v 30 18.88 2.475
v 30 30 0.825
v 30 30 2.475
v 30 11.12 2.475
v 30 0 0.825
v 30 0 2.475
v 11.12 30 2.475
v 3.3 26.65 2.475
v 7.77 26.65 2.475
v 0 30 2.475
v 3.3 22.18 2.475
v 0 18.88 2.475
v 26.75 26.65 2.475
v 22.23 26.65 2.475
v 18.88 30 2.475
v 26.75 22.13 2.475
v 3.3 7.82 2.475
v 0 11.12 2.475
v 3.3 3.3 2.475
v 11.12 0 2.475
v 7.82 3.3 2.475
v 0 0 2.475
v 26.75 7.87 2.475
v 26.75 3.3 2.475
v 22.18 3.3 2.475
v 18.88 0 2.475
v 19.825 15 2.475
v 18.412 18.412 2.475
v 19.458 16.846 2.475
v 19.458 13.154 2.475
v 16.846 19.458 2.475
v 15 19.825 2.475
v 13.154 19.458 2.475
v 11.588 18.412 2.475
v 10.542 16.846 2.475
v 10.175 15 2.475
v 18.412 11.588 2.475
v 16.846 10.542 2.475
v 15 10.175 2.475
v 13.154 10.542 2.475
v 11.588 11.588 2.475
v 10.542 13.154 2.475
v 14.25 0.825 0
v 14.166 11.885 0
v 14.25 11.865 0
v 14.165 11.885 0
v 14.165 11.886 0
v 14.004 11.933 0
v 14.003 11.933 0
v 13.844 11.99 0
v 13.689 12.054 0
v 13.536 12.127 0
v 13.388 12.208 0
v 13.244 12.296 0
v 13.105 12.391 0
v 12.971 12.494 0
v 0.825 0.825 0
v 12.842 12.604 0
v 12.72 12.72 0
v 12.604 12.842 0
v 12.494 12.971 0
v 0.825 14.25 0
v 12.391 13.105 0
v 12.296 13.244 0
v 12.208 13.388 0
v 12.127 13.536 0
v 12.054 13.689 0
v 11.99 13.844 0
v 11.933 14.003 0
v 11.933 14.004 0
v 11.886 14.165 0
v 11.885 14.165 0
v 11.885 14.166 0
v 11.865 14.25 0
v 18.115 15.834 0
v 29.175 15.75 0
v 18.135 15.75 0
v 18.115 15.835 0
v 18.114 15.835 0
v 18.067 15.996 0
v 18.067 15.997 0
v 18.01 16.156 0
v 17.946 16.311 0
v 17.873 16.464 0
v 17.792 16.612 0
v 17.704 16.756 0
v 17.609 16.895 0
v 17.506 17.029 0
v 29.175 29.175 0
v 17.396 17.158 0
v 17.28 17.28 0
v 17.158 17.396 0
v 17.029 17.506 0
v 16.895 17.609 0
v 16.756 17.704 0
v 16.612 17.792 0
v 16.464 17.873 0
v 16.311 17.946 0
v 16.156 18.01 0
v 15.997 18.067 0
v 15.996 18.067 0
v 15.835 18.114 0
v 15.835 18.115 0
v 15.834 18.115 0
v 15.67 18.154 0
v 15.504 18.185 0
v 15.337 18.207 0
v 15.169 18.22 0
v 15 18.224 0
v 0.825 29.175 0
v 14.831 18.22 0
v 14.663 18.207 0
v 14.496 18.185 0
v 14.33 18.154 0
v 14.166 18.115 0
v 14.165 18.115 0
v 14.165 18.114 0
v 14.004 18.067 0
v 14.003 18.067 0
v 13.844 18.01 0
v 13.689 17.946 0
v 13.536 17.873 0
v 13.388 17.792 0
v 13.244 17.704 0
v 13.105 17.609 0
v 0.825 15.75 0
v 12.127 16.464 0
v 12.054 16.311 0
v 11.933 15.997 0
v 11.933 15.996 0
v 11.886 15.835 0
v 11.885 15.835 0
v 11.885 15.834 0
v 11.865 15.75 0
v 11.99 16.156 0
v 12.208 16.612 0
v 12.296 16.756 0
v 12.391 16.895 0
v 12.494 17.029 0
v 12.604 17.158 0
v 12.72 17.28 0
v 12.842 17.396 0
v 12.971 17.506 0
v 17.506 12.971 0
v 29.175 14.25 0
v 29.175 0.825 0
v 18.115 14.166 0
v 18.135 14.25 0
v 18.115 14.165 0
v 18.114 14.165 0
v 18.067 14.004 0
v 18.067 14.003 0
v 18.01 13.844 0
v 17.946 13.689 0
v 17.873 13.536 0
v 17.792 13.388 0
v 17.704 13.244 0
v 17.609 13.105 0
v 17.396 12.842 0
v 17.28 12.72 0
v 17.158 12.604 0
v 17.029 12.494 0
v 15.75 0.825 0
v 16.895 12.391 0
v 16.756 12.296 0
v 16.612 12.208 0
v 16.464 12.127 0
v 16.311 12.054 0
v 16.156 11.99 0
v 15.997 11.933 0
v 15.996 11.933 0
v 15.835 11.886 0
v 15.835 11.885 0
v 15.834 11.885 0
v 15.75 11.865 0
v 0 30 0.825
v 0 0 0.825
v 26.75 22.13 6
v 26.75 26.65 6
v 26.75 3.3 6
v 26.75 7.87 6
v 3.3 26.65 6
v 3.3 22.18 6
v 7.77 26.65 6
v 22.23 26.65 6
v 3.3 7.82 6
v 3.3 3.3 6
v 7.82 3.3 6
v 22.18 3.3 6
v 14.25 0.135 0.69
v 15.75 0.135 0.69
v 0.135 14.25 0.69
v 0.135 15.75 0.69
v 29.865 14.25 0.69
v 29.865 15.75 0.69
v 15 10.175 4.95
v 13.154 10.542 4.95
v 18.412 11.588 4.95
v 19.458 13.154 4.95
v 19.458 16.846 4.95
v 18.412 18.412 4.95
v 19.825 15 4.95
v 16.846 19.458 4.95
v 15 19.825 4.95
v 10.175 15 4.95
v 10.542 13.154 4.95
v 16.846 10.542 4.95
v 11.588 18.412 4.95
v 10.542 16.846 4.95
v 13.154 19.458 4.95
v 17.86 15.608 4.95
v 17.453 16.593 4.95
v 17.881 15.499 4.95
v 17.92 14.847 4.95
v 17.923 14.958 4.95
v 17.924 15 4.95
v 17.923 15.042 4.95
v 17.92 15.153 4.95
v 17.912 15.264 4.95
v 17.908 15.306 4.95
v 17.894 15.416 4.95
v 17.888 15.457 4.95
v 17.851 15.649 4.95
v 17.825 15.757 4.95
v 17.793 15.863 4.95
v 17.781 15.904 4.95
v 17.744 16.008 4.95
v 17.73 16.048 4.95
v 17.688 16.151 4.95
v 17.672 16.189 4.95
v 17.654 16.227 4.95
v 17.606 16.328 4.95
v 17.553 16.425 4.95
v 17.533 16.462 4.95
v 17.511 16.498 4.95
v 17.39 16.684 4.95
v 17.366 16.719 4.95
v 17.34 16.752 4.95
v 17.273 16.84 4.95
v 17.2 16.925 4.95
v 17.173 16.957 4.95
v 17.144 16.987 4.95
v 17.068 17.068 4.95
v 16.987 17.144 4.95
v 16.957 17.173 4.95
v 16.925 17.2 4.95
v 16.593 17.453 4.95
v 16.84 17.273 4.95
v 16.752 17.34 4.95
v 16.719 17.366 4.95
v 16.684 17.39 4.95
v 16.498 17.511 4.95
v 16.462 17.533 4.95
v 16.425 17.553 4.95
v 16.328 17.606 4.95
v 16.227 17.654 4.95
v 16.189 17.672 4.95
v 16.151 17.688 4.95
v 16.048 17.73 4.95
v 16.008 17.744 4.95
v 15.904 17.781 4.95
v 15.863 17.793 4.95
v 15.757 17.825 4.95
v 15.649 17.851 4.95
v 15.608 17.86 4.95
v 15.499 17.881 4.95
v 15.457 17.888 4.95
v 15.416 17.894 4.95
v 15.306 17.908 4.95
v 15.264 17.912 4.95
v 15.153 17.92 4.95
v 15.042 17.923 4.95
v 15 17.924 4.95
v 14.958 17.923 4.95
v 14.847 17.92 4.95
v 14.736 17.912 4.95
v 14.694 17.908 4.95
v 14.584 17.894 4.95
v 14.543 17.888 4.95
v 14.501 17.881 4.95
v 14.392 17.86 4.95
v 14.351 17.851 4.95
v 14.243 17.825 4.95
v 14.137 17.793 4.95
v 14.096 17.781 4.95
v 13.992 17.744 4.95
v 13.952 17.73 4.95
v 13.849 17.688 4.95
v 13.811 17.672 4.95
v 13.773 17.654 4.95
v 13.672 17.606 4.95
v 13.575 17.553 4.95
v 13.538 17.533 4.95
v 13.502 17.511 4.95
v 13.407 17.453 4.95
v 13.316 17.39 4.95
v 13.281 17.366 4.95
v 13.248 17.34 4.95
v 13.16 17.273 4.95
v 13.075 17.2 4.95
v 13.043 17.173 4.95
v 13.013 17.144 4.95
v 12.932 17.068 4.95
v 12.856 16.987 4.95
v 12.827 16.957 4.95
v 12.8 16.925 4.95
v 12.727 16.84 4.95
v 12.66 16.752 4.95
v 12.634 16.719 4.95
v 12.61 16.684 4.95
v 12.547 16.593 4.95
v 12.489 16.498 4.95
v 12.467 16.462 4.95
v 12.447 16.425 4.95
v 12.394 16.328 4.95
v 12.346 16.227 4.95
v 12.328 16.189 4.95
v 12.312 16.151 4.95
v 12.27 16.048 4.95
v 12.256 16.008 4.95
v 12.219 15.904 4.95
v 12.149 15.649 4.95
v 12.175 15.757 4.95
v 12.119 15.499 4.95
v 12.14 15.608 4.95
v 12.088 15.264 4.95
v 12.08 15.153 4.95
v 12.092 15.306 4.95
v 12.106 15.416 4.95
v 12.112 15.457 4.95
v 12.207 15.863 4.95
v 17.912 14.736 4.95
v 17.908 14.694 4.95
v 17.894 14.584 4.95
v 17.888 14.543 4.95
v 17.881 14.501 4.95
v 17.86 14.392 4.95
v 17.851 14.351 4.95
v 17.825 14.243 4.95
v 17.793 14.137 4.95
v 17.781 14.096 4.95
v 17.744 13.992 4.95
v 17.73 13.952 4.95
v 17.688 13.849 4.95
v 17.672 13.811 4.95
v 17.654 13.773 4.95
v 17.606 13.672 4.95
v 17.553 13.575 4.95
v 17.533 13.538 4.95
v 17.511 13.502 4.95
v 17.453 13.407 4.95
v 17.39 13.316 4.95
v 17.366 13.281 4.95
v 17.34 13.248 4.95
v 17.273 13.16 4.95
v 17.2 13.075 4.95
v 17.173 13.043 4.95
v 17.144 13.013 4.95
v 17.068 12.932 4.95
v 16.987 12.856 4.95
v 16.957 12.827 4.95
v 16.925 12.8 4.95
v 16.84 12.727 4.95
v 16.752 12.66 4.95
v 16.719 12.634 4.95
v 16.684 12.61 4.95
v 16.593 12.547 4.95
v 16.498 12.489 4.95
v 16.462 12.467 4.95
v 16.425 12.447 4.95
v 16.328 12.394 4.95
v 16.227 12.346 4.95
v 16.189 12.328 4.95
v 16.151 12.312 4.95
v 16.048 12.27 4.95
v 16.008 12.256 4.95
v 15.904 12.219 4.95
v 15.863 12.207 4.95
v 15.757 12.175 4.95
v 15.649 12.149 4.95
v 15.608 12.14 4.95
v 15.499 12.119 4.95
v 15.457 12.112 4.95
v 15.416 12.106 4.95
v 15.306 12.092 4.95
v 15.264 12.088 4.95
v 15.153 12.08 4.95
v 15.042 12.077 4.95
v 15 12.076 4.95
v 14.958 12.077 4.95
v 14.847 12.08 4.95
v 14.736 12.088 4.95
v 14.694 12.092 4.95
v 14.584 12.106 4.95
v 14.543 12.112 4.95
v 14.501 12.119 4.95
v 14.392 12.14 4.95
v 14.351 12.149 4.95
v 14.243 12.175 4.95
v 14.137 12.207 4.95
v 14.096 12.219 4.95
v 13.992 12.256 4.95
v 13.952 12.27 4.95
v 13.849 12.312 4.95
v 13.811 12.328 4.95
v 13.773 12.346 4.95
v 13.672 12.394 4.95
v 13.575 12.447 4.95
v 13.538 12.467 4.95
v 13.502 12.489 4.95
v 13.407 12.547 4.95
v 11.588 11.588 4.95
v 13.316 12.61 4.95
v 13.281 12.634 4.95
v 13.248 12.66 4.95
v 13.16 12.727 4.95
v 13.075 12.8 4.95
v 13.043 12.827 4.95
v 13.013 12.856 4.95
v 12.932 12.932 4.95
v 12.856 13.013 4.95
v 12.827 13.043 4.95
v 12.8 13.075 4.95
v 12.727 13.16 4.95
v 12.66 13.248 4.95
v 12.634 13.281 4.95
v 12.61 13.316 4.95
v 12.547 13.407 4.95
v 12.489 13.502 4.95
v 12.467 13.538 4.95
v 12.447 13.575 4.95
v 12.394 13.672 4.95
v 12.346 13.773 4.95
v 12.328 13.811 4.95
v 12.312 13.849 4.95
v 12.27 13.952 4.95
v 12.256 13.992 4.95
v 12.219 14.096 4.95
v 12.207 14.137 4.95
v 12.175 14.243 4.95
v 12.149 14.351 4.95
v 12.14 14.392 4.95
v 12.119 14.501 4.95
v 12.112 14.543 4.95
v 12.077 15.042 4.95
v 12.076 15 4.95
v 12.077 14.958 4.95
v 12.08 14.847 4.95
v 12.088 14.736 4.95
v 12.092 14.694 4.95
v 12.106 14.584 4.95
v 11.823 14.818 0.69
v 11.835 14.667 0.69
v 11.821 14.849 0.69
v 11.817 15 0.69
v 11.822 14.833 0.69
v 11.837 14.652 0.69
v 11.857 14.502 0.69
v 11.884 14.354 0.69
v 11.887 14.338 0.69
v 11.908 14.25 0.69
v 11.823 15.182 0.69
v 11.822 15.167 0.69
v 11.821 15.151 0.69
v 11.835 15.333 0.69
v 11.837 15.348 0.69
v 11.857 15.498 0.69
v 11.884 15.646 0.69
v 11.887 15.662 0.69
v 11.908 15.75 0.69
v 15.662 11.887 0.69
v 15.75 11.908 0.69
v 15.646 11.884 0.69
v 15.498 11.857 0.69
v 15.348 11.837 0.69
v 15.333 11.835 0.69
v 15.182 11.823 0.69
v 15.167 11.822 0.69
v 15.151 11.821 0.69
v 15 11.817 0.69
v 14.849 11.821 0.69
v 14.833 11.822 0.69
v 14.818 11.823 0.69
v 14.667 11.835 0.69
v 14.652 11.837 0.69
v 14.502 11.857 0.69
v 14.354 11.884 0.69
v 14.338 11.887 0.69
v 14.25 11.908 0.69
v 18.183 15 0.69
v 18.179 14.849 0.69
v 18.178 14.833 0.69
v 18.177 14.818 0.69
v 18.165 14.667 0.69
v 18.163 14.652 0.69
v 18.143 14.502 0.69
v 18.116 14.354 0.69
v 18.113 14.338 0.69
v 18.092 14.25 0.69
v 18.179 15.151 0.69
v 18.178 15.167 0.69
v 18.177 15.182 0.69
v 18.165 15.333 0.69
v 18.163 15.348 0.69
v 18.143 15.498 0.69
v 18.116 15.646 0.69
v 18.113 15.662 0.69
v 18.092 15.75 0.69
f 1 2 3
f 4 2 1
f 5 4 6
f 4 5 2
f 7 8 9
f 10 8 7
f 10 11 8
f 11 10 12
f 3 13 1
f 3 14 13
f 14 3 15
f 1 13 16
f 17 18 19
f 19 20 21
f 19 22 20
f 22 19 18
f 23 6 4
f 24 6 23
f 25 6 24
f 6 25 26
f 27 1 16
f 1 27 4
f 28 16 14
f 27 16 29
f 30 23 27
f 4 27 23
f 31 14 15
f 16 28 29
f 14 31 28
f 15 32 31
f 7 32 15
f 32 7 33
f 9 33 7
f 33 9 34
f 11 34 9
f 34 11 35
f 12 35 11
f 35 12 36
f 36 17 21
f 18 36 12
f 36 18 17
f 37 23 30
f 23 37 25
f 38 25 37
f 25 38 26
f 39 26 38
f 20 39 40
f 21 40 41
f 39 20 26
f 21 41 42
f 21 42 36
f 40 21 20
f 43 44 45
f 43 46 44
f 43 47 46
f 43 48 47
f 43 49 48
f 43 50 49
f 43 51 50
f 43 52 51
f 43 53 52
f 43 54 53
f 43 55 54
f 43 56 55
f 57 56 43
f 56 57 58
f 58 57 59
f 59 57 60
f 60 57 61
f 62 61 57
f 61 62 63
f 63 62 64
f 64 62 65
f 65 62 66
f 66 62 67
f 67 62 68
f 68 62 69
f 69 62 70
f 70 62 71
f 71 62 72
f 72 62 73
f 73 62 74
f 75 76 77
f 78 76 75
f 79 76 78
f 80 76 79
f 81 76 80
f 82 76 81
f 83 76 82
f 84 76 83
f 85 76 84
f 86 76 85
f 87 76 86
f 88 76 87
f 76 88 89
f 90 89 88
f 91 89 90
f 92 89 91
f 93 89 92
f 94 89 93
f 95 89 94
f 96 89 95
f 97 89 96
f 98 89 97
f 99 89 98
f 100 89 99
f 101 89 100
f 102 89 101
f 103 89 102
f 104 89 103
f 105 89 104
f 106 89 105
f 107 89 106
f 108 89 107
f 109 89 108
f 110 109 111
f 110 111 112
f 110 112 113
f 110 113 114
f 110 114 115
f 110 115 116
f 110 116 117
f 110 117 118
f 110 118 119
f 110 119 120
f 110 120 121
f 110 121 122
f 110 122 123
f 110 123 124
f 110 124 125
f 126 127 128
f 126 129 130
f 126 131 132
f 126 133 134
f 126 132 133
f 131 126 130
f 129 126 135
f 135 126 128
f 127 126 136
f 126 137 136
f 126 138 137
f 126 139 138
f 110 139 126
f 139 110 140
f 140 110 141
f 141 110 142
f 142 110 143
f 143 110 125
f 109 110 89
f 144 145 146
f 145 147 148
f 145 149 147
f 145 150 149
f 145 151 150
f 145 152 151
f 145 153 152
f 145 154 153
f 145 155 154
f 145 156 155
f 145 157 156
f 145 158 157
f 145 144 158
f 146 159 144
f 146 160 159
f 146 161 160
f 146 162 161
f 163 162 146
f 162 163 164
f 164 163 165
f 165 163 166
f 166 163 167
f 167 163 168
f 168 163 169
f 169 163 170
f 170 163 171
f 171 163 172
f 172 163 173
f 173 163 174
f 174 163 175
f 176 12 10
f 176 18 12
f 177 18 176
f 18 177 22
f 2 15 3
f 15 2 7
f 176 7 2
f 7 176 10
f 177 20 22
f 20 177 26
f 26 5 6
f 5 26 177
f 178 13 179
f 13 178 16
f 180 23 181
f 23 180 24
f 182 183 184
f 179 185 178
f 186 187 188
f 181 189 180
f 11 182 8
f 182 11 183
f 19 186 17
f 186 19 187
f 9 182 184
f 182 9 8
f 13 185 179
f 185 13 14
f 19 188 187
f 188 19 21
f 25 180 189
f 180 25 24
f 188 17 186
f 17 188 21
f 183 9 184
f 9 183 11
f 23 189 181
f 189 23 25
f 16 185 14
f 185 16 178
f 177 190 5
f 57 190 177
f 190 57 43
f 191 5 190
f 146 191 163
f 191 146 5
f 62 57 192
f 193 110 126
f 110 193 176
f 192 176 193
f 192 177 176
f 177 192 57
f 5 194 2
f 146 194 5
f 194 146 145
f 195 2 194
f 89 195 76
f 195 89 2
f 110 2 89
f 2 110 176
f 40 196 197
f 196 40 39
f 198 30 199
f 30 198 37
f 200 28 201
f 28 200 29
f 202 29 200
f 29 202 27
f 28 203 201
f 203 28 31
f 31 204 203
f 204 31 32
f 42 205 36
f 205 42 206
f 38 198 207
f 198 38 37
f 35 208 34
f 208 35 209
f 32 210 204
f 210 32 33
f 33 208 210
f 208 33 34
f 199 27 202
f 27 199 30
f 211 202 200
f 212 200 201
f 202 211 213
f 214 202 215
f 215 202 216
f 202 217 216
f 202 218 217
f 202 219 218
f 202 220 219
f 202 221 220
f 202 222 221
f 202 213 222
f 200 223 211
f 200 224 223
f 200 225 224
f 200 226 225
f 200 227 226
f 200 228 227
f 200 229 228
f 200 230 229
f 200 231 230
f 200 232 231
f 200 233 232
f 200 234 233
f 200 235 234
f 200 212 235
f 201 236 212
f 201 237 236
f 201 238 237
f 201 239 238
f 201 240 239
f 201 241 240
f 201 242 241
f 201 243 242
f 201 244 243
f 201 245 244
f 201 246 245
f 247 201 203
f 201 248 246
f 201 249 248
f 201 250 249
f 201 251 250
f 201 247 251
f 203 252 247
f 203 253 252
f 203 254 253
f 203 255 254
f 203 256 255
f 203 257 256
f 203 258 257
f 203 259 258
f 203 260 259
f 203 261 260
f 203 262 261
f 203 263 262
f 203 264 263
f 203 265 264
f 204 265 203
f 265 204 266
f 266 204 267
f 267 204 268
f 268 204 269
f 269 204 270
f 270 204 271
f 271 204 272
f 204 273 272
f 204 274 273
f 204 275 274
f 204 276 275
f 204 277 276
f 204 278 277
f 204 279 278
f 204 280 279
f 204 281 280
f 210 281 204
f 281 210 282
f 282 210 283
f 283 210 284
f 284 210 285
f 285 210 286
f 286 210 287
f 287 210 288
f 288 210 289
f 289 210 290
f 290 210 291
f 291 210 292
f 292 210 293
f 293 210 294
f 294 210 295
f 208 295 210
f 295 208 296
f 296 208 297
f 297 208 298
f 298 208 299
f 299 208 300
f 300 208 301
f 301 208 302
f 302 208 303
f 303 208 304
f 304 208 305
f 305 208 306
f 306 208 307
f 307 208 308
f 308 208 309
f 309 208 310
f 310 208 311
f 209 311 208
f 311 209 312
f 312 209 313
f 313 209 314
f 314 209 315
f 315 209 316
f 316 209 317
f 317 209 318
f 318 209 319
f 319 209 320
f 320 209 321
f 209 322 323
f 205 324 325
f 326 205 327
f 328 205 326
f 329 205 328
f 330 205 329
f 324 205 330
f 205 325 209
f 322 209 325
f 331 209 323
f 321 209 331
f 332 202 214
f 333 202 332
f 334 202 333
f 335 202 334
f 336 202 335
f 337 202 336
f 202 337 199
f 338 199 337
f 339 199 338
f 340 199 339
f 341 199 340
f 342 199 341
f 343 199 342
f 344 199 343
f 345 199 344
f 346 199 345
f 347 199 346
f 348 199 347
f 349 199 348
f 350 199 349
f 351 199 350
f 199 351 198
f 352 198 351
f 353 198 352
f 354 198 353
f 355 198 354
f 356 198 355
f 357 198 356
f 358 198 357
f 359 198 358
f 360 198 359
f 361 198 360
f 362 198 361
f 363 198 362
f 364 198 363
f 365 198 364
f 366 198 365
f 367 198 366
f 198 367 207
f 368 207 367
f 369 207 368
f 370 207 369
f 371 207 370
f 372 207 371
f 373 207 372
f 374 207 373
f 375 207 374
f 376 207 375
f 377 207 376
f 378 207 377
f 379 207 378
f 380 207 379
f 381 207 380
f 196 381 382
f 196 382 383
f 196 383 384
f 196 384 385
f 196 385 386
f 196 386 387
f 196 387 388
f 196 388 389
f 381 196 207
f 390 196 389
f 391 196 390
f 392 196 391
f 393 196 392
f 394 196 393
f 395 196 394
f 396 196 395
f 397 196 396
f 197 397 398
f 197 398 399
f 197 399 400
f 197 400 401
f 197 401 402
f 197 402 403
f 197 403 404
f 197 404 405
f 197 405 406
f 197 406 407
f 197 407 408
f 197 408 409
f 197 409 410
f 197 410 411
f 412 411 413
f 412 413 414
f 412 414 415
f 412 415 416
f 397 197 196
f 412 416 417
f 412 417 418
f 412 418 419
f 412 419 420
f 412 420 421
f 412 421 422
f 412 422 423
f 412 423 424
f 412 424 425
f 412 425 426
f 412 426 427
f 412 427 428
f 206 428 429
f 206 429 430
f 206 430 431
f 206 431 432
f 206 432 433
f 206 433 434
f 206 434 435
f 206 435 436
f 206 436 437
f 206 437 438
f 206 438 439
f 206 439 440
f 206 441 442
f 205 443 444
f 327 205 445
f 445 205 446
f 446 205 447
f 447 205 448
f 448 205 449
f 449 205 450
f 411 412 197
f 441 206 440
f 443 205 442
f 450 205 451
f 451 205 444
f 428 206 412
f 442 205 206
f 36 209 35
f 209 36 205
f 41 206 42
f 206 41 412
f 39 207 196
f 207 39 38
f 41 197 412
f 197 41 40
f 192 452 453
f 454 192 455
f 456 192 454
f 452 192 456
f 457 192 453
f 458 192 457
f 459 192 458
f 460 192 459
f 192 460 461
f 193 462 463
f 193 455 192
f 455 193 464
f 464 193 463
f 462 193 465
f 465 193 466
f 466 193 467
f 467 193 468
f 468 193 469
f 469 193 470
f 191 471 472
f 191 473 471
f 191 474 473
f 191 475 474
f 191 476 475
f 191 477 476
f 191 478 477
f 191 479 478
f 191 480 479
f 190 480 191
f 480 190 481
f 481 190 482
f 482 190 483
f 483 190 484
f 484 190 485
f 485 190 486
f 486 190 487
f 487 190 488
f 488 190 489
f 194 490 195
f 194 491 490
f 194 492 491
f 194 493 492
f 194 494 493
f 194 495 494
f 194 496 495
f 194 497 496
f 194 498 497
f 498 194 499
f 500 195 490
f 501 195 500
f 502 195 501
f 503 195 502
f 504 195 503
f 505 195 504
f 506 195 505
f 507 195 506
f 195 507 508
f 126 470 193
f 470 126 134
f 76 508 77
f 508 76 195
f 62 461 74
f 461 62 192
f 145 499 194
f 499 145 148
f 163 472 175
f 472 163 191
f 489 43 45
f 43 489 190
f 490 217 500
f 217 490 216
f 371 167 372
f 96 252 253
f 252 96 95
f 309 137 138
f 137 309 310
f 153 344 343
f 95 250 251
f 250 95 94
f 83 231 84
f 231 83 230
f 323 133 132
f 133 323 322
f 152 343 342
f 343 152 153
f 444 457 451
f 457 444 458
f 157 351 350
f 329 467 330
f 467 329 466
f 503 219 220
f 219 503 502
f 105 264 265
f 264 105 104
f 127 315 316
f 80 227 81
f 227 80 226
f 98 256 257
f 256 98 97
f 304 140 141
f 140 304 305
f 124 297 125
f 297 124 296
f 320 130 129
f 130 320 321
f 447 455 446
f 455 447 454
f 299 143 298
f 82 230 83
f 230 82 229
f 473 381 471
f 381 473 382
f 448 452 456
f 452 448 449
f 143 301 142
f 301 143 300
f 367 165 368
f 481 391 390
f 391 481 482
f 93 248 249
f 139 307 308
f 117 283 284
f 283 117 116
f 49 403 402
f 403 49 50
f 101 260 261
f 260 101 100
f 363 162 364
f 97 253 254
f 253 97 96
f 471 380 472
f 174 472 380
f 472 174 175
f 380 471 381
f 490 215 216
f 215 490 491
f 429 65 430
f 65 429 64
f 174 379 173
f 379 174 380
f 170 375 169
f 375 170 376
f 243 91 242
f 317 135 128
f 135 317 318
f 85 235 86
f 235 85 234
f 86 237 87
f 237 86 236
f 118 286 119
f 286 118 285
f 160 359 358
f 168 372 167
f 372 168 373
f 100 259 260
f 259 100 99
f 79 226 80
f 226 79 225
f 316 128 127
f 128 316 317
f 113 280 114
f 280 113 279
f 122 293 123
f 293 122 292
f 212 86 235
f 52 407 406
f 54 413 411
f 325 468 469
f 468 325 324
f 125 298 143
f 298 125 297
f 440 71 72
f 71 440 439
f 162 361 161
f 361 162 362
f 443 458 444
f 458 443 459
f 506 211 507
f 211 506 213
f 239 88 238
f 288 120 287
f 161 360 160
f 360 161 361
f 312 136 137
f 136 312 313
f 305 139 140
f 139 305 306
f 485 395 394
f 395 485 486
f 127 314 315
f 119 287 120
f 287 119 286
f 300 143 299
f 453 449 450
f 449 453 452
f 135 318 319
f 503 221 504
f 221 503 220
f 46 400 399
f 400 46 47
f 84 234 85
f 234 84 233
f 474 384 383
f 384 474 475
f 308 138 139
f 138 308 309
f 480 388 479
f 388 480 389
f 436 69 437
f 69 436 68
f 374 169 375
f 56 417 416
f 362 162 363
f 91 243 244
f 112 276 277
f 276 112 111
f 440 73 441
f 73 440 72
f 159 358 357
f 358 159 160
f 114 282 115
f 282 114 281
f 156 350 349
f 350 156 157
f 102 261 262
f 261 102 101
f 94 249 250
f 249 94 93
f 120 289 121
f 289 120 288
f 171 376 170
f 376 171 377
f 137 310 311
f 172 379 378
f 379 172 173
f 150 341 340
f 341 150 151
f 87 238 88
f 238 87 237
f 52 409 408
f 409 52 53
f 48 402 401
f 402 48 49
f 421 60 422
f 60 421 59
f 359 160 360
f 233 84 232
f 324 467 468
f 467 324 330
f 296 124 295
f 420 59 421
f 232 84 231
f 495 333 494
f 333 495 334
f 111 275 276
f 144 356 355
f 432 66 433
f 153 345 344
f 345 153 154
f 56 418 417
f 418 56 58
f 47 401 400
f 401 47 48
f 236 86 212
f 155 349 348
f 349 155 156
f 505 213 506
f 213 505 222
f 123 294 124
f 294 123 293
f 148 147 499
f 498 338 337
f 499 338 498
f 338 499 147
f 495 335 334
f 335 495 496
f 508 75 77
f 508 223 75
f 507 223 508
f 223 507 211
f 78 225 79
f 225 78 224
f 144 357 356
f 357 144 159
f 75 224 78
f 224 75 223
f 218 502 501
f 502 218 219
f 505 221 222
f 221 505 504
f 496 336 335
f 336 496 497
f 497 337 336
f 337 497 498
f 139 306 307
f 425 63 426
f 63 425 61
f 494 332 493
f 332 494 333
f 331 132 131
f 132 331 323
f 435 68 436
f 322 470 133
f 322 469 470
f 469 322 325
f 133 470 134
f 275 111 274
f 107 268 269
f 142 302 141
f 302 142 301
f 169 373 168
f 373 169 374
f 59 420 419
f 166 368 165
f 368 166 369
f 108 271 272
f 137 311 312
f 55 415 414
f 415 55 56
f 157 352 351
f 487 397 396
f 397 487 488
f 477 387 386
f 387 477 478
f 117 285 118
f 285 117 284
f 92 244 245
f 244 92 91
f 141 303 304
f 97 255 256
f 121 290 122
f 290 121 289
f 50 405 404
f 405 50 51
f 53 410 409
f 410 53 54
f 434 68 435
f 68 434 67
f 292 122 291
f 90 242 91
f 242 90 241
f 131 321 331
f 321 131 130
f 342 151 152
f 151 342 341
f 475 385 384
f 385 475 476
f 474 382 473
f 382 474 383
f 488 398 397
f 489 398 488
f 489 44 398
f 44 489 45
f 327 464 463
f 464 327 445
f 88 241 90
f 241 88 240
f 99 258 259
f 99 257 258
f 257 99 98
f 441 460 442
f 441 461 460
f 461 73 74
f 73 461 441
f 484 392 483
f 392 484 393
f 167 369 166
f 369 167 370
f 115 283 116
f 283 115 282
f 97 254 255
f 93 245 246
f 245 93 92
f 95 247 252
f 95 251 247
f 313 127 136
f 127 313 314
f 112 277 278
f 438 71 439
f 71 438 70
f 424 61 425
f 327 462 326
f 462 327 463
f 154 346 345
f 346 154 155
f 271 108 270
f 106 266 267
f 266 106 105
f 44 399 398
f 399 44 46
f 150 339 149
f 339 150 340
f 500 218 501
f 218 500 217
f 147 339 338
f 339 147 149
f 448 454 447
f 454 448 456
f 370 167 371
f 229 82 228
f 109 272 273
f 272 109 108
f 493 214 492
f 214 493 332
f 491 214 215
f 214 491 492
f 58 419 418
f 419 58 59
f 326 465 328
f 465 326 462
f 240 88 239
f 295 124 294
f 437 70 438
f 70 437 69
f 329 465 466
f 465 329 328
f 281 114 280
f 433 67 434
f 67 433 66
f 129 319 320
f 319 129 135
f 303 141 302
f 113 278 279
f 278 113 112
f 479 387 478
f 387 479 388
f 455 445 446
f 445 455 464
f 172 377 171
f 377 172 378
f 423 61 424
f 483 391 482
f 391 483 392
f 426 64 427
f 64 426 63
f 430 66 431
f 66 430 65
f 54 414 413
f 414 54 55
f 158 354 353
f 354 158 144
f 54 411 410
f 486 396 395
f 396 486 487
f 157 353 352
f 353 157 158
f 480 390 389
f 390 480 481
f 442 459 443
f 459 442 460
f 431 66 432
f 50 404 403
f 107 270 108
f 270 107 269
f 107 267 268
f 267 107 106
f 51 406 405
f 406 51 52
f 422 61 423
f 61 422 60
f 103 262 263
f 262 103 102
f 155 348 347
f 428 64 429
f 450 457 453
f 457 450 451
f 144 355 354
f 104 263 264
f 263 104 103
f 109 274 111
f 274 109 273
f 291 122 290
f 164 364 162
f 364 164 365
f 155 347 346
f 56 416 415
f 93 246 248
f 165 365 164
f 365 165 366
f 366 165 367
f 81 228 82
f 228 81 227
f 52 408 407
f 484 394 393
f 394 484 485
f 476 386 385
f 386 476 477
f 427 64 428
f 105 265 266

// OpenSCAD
// file: settings.scad
cube_width=30;
cube_height=16;
cube_thickness=3.3;

cap_width=30;
cap_height=6;
cap_thickness=3.3;

glyph_depth=0.7;
glyph_thickness=1.5;

photo_resitor_hole_r = 2.4;
spring_contact_hole_r = 3.125;
// file: cap_1x1.scad
include <settings.scad>

module cap_1x1(width, height, thickness, holes_mask)
{
    width1=width-thickness;
    difference()
    {
        union()
        {
            cube([width, width, thickness*3/4]);
            translate([thickness,thickness,0])cube([width-2*(thickness-0.025), width-2*(thickness+0.025), height]);
        }
        union()
        {
            translate([width/2,width/2,0])rotate([0,0,45])translate([-width1/2,-width1/2,thickness*3/4]) cube([width1,width1,height]);
                        //corners
            translate([0,0.25*thickness,0])rotate([45,0,0]) translate([-0.5*width, -width, -0.5*height]) cube([2*width, width, 2*height]);
            translate([0.25*thickness,0,0]) rotate([0,-45,0]) translate([-width, -0.5*width, -0.5*height]) cube([width, 2*width, 2*height]);
            translate([width-0.25*thickness,0,0]) rotate([0,45,0]) translate([0, 0, -0.5*height]) cube([width, 2*width, 2*height]);
            translate([0,width-0.25*thickness,0]) rotate([-45,0,0]) translate([-0.5*width, 0, -0.5*height]) cube([2*width, width, 2*height]);
            
            if (holes_mask >= 8)
            {
                translate([width/2, thickness-1.5, -0.5]) cylinder(r=1.15, h=height*1.5, $fn=80);
            }
            if ((holes_mask%8) >= 4)
            {
                translate([width/2, width-thickness+1.5, -0.5]) cylinder(r=1.15, h=height*1.5, $fn=80);
            }
            if ((holes_mask%4)>= 2)
            {
                translate([thickness-1.5, width/2, -0.5]) cylinder(r=1.15, h=height*1.5, $fn=80);
            }
            if (holes_mask%2 >= 1)
            {
                translate([width-thickness+1.5, width/2, -0.5]) cylinder(r=1.15, h=height*1.5, $fn=80);
            }
        }
    }
}

cap_1x1(cap_width, cap_height, cap_thickness, 9);
//ring(10,1,1);
//arrow(1, 20, 3, 1);
//transistor_npn(30, 1, 1);
// main file
use <cap_1x1.scad>
include <settings.scad>

module cap_1x1_wireY(width, height, thickness)
{
    cr1 = spring_contact_hole_r+0.1;
    cr2 = spring_contact_hole_r-0.3;
    difference()
    {
        union()
        {
            cap_1x1(width, height, thickness, 0); //1
            translate([width/2,width/2,0]) cylinder(r=(cr2+2), h=thickness*1.5);
        }
        union()
        {
            translate([0,(width-glyph_thickness)/2,-0.01]) cube([width, glyph_thickness, glyph_depth]);
            translate([(width-glyph_thickness)/2, 0, -0.01]) cube([glyph_thickness, width/2, glyph_depth]);
            translate([width/2, width/2, -0.01]) cylinder(h=glyph_depth, r=1.5*glyph_thickness, $fn=120);
            translate([width/2,width/2,-0.01])cylinder(r1=cr1, r2=cr2, h=2*thickness, $fn=120);
        }
    }
}

cap_1x1_wireY(cap_width, cap_height, cap_thickness);
